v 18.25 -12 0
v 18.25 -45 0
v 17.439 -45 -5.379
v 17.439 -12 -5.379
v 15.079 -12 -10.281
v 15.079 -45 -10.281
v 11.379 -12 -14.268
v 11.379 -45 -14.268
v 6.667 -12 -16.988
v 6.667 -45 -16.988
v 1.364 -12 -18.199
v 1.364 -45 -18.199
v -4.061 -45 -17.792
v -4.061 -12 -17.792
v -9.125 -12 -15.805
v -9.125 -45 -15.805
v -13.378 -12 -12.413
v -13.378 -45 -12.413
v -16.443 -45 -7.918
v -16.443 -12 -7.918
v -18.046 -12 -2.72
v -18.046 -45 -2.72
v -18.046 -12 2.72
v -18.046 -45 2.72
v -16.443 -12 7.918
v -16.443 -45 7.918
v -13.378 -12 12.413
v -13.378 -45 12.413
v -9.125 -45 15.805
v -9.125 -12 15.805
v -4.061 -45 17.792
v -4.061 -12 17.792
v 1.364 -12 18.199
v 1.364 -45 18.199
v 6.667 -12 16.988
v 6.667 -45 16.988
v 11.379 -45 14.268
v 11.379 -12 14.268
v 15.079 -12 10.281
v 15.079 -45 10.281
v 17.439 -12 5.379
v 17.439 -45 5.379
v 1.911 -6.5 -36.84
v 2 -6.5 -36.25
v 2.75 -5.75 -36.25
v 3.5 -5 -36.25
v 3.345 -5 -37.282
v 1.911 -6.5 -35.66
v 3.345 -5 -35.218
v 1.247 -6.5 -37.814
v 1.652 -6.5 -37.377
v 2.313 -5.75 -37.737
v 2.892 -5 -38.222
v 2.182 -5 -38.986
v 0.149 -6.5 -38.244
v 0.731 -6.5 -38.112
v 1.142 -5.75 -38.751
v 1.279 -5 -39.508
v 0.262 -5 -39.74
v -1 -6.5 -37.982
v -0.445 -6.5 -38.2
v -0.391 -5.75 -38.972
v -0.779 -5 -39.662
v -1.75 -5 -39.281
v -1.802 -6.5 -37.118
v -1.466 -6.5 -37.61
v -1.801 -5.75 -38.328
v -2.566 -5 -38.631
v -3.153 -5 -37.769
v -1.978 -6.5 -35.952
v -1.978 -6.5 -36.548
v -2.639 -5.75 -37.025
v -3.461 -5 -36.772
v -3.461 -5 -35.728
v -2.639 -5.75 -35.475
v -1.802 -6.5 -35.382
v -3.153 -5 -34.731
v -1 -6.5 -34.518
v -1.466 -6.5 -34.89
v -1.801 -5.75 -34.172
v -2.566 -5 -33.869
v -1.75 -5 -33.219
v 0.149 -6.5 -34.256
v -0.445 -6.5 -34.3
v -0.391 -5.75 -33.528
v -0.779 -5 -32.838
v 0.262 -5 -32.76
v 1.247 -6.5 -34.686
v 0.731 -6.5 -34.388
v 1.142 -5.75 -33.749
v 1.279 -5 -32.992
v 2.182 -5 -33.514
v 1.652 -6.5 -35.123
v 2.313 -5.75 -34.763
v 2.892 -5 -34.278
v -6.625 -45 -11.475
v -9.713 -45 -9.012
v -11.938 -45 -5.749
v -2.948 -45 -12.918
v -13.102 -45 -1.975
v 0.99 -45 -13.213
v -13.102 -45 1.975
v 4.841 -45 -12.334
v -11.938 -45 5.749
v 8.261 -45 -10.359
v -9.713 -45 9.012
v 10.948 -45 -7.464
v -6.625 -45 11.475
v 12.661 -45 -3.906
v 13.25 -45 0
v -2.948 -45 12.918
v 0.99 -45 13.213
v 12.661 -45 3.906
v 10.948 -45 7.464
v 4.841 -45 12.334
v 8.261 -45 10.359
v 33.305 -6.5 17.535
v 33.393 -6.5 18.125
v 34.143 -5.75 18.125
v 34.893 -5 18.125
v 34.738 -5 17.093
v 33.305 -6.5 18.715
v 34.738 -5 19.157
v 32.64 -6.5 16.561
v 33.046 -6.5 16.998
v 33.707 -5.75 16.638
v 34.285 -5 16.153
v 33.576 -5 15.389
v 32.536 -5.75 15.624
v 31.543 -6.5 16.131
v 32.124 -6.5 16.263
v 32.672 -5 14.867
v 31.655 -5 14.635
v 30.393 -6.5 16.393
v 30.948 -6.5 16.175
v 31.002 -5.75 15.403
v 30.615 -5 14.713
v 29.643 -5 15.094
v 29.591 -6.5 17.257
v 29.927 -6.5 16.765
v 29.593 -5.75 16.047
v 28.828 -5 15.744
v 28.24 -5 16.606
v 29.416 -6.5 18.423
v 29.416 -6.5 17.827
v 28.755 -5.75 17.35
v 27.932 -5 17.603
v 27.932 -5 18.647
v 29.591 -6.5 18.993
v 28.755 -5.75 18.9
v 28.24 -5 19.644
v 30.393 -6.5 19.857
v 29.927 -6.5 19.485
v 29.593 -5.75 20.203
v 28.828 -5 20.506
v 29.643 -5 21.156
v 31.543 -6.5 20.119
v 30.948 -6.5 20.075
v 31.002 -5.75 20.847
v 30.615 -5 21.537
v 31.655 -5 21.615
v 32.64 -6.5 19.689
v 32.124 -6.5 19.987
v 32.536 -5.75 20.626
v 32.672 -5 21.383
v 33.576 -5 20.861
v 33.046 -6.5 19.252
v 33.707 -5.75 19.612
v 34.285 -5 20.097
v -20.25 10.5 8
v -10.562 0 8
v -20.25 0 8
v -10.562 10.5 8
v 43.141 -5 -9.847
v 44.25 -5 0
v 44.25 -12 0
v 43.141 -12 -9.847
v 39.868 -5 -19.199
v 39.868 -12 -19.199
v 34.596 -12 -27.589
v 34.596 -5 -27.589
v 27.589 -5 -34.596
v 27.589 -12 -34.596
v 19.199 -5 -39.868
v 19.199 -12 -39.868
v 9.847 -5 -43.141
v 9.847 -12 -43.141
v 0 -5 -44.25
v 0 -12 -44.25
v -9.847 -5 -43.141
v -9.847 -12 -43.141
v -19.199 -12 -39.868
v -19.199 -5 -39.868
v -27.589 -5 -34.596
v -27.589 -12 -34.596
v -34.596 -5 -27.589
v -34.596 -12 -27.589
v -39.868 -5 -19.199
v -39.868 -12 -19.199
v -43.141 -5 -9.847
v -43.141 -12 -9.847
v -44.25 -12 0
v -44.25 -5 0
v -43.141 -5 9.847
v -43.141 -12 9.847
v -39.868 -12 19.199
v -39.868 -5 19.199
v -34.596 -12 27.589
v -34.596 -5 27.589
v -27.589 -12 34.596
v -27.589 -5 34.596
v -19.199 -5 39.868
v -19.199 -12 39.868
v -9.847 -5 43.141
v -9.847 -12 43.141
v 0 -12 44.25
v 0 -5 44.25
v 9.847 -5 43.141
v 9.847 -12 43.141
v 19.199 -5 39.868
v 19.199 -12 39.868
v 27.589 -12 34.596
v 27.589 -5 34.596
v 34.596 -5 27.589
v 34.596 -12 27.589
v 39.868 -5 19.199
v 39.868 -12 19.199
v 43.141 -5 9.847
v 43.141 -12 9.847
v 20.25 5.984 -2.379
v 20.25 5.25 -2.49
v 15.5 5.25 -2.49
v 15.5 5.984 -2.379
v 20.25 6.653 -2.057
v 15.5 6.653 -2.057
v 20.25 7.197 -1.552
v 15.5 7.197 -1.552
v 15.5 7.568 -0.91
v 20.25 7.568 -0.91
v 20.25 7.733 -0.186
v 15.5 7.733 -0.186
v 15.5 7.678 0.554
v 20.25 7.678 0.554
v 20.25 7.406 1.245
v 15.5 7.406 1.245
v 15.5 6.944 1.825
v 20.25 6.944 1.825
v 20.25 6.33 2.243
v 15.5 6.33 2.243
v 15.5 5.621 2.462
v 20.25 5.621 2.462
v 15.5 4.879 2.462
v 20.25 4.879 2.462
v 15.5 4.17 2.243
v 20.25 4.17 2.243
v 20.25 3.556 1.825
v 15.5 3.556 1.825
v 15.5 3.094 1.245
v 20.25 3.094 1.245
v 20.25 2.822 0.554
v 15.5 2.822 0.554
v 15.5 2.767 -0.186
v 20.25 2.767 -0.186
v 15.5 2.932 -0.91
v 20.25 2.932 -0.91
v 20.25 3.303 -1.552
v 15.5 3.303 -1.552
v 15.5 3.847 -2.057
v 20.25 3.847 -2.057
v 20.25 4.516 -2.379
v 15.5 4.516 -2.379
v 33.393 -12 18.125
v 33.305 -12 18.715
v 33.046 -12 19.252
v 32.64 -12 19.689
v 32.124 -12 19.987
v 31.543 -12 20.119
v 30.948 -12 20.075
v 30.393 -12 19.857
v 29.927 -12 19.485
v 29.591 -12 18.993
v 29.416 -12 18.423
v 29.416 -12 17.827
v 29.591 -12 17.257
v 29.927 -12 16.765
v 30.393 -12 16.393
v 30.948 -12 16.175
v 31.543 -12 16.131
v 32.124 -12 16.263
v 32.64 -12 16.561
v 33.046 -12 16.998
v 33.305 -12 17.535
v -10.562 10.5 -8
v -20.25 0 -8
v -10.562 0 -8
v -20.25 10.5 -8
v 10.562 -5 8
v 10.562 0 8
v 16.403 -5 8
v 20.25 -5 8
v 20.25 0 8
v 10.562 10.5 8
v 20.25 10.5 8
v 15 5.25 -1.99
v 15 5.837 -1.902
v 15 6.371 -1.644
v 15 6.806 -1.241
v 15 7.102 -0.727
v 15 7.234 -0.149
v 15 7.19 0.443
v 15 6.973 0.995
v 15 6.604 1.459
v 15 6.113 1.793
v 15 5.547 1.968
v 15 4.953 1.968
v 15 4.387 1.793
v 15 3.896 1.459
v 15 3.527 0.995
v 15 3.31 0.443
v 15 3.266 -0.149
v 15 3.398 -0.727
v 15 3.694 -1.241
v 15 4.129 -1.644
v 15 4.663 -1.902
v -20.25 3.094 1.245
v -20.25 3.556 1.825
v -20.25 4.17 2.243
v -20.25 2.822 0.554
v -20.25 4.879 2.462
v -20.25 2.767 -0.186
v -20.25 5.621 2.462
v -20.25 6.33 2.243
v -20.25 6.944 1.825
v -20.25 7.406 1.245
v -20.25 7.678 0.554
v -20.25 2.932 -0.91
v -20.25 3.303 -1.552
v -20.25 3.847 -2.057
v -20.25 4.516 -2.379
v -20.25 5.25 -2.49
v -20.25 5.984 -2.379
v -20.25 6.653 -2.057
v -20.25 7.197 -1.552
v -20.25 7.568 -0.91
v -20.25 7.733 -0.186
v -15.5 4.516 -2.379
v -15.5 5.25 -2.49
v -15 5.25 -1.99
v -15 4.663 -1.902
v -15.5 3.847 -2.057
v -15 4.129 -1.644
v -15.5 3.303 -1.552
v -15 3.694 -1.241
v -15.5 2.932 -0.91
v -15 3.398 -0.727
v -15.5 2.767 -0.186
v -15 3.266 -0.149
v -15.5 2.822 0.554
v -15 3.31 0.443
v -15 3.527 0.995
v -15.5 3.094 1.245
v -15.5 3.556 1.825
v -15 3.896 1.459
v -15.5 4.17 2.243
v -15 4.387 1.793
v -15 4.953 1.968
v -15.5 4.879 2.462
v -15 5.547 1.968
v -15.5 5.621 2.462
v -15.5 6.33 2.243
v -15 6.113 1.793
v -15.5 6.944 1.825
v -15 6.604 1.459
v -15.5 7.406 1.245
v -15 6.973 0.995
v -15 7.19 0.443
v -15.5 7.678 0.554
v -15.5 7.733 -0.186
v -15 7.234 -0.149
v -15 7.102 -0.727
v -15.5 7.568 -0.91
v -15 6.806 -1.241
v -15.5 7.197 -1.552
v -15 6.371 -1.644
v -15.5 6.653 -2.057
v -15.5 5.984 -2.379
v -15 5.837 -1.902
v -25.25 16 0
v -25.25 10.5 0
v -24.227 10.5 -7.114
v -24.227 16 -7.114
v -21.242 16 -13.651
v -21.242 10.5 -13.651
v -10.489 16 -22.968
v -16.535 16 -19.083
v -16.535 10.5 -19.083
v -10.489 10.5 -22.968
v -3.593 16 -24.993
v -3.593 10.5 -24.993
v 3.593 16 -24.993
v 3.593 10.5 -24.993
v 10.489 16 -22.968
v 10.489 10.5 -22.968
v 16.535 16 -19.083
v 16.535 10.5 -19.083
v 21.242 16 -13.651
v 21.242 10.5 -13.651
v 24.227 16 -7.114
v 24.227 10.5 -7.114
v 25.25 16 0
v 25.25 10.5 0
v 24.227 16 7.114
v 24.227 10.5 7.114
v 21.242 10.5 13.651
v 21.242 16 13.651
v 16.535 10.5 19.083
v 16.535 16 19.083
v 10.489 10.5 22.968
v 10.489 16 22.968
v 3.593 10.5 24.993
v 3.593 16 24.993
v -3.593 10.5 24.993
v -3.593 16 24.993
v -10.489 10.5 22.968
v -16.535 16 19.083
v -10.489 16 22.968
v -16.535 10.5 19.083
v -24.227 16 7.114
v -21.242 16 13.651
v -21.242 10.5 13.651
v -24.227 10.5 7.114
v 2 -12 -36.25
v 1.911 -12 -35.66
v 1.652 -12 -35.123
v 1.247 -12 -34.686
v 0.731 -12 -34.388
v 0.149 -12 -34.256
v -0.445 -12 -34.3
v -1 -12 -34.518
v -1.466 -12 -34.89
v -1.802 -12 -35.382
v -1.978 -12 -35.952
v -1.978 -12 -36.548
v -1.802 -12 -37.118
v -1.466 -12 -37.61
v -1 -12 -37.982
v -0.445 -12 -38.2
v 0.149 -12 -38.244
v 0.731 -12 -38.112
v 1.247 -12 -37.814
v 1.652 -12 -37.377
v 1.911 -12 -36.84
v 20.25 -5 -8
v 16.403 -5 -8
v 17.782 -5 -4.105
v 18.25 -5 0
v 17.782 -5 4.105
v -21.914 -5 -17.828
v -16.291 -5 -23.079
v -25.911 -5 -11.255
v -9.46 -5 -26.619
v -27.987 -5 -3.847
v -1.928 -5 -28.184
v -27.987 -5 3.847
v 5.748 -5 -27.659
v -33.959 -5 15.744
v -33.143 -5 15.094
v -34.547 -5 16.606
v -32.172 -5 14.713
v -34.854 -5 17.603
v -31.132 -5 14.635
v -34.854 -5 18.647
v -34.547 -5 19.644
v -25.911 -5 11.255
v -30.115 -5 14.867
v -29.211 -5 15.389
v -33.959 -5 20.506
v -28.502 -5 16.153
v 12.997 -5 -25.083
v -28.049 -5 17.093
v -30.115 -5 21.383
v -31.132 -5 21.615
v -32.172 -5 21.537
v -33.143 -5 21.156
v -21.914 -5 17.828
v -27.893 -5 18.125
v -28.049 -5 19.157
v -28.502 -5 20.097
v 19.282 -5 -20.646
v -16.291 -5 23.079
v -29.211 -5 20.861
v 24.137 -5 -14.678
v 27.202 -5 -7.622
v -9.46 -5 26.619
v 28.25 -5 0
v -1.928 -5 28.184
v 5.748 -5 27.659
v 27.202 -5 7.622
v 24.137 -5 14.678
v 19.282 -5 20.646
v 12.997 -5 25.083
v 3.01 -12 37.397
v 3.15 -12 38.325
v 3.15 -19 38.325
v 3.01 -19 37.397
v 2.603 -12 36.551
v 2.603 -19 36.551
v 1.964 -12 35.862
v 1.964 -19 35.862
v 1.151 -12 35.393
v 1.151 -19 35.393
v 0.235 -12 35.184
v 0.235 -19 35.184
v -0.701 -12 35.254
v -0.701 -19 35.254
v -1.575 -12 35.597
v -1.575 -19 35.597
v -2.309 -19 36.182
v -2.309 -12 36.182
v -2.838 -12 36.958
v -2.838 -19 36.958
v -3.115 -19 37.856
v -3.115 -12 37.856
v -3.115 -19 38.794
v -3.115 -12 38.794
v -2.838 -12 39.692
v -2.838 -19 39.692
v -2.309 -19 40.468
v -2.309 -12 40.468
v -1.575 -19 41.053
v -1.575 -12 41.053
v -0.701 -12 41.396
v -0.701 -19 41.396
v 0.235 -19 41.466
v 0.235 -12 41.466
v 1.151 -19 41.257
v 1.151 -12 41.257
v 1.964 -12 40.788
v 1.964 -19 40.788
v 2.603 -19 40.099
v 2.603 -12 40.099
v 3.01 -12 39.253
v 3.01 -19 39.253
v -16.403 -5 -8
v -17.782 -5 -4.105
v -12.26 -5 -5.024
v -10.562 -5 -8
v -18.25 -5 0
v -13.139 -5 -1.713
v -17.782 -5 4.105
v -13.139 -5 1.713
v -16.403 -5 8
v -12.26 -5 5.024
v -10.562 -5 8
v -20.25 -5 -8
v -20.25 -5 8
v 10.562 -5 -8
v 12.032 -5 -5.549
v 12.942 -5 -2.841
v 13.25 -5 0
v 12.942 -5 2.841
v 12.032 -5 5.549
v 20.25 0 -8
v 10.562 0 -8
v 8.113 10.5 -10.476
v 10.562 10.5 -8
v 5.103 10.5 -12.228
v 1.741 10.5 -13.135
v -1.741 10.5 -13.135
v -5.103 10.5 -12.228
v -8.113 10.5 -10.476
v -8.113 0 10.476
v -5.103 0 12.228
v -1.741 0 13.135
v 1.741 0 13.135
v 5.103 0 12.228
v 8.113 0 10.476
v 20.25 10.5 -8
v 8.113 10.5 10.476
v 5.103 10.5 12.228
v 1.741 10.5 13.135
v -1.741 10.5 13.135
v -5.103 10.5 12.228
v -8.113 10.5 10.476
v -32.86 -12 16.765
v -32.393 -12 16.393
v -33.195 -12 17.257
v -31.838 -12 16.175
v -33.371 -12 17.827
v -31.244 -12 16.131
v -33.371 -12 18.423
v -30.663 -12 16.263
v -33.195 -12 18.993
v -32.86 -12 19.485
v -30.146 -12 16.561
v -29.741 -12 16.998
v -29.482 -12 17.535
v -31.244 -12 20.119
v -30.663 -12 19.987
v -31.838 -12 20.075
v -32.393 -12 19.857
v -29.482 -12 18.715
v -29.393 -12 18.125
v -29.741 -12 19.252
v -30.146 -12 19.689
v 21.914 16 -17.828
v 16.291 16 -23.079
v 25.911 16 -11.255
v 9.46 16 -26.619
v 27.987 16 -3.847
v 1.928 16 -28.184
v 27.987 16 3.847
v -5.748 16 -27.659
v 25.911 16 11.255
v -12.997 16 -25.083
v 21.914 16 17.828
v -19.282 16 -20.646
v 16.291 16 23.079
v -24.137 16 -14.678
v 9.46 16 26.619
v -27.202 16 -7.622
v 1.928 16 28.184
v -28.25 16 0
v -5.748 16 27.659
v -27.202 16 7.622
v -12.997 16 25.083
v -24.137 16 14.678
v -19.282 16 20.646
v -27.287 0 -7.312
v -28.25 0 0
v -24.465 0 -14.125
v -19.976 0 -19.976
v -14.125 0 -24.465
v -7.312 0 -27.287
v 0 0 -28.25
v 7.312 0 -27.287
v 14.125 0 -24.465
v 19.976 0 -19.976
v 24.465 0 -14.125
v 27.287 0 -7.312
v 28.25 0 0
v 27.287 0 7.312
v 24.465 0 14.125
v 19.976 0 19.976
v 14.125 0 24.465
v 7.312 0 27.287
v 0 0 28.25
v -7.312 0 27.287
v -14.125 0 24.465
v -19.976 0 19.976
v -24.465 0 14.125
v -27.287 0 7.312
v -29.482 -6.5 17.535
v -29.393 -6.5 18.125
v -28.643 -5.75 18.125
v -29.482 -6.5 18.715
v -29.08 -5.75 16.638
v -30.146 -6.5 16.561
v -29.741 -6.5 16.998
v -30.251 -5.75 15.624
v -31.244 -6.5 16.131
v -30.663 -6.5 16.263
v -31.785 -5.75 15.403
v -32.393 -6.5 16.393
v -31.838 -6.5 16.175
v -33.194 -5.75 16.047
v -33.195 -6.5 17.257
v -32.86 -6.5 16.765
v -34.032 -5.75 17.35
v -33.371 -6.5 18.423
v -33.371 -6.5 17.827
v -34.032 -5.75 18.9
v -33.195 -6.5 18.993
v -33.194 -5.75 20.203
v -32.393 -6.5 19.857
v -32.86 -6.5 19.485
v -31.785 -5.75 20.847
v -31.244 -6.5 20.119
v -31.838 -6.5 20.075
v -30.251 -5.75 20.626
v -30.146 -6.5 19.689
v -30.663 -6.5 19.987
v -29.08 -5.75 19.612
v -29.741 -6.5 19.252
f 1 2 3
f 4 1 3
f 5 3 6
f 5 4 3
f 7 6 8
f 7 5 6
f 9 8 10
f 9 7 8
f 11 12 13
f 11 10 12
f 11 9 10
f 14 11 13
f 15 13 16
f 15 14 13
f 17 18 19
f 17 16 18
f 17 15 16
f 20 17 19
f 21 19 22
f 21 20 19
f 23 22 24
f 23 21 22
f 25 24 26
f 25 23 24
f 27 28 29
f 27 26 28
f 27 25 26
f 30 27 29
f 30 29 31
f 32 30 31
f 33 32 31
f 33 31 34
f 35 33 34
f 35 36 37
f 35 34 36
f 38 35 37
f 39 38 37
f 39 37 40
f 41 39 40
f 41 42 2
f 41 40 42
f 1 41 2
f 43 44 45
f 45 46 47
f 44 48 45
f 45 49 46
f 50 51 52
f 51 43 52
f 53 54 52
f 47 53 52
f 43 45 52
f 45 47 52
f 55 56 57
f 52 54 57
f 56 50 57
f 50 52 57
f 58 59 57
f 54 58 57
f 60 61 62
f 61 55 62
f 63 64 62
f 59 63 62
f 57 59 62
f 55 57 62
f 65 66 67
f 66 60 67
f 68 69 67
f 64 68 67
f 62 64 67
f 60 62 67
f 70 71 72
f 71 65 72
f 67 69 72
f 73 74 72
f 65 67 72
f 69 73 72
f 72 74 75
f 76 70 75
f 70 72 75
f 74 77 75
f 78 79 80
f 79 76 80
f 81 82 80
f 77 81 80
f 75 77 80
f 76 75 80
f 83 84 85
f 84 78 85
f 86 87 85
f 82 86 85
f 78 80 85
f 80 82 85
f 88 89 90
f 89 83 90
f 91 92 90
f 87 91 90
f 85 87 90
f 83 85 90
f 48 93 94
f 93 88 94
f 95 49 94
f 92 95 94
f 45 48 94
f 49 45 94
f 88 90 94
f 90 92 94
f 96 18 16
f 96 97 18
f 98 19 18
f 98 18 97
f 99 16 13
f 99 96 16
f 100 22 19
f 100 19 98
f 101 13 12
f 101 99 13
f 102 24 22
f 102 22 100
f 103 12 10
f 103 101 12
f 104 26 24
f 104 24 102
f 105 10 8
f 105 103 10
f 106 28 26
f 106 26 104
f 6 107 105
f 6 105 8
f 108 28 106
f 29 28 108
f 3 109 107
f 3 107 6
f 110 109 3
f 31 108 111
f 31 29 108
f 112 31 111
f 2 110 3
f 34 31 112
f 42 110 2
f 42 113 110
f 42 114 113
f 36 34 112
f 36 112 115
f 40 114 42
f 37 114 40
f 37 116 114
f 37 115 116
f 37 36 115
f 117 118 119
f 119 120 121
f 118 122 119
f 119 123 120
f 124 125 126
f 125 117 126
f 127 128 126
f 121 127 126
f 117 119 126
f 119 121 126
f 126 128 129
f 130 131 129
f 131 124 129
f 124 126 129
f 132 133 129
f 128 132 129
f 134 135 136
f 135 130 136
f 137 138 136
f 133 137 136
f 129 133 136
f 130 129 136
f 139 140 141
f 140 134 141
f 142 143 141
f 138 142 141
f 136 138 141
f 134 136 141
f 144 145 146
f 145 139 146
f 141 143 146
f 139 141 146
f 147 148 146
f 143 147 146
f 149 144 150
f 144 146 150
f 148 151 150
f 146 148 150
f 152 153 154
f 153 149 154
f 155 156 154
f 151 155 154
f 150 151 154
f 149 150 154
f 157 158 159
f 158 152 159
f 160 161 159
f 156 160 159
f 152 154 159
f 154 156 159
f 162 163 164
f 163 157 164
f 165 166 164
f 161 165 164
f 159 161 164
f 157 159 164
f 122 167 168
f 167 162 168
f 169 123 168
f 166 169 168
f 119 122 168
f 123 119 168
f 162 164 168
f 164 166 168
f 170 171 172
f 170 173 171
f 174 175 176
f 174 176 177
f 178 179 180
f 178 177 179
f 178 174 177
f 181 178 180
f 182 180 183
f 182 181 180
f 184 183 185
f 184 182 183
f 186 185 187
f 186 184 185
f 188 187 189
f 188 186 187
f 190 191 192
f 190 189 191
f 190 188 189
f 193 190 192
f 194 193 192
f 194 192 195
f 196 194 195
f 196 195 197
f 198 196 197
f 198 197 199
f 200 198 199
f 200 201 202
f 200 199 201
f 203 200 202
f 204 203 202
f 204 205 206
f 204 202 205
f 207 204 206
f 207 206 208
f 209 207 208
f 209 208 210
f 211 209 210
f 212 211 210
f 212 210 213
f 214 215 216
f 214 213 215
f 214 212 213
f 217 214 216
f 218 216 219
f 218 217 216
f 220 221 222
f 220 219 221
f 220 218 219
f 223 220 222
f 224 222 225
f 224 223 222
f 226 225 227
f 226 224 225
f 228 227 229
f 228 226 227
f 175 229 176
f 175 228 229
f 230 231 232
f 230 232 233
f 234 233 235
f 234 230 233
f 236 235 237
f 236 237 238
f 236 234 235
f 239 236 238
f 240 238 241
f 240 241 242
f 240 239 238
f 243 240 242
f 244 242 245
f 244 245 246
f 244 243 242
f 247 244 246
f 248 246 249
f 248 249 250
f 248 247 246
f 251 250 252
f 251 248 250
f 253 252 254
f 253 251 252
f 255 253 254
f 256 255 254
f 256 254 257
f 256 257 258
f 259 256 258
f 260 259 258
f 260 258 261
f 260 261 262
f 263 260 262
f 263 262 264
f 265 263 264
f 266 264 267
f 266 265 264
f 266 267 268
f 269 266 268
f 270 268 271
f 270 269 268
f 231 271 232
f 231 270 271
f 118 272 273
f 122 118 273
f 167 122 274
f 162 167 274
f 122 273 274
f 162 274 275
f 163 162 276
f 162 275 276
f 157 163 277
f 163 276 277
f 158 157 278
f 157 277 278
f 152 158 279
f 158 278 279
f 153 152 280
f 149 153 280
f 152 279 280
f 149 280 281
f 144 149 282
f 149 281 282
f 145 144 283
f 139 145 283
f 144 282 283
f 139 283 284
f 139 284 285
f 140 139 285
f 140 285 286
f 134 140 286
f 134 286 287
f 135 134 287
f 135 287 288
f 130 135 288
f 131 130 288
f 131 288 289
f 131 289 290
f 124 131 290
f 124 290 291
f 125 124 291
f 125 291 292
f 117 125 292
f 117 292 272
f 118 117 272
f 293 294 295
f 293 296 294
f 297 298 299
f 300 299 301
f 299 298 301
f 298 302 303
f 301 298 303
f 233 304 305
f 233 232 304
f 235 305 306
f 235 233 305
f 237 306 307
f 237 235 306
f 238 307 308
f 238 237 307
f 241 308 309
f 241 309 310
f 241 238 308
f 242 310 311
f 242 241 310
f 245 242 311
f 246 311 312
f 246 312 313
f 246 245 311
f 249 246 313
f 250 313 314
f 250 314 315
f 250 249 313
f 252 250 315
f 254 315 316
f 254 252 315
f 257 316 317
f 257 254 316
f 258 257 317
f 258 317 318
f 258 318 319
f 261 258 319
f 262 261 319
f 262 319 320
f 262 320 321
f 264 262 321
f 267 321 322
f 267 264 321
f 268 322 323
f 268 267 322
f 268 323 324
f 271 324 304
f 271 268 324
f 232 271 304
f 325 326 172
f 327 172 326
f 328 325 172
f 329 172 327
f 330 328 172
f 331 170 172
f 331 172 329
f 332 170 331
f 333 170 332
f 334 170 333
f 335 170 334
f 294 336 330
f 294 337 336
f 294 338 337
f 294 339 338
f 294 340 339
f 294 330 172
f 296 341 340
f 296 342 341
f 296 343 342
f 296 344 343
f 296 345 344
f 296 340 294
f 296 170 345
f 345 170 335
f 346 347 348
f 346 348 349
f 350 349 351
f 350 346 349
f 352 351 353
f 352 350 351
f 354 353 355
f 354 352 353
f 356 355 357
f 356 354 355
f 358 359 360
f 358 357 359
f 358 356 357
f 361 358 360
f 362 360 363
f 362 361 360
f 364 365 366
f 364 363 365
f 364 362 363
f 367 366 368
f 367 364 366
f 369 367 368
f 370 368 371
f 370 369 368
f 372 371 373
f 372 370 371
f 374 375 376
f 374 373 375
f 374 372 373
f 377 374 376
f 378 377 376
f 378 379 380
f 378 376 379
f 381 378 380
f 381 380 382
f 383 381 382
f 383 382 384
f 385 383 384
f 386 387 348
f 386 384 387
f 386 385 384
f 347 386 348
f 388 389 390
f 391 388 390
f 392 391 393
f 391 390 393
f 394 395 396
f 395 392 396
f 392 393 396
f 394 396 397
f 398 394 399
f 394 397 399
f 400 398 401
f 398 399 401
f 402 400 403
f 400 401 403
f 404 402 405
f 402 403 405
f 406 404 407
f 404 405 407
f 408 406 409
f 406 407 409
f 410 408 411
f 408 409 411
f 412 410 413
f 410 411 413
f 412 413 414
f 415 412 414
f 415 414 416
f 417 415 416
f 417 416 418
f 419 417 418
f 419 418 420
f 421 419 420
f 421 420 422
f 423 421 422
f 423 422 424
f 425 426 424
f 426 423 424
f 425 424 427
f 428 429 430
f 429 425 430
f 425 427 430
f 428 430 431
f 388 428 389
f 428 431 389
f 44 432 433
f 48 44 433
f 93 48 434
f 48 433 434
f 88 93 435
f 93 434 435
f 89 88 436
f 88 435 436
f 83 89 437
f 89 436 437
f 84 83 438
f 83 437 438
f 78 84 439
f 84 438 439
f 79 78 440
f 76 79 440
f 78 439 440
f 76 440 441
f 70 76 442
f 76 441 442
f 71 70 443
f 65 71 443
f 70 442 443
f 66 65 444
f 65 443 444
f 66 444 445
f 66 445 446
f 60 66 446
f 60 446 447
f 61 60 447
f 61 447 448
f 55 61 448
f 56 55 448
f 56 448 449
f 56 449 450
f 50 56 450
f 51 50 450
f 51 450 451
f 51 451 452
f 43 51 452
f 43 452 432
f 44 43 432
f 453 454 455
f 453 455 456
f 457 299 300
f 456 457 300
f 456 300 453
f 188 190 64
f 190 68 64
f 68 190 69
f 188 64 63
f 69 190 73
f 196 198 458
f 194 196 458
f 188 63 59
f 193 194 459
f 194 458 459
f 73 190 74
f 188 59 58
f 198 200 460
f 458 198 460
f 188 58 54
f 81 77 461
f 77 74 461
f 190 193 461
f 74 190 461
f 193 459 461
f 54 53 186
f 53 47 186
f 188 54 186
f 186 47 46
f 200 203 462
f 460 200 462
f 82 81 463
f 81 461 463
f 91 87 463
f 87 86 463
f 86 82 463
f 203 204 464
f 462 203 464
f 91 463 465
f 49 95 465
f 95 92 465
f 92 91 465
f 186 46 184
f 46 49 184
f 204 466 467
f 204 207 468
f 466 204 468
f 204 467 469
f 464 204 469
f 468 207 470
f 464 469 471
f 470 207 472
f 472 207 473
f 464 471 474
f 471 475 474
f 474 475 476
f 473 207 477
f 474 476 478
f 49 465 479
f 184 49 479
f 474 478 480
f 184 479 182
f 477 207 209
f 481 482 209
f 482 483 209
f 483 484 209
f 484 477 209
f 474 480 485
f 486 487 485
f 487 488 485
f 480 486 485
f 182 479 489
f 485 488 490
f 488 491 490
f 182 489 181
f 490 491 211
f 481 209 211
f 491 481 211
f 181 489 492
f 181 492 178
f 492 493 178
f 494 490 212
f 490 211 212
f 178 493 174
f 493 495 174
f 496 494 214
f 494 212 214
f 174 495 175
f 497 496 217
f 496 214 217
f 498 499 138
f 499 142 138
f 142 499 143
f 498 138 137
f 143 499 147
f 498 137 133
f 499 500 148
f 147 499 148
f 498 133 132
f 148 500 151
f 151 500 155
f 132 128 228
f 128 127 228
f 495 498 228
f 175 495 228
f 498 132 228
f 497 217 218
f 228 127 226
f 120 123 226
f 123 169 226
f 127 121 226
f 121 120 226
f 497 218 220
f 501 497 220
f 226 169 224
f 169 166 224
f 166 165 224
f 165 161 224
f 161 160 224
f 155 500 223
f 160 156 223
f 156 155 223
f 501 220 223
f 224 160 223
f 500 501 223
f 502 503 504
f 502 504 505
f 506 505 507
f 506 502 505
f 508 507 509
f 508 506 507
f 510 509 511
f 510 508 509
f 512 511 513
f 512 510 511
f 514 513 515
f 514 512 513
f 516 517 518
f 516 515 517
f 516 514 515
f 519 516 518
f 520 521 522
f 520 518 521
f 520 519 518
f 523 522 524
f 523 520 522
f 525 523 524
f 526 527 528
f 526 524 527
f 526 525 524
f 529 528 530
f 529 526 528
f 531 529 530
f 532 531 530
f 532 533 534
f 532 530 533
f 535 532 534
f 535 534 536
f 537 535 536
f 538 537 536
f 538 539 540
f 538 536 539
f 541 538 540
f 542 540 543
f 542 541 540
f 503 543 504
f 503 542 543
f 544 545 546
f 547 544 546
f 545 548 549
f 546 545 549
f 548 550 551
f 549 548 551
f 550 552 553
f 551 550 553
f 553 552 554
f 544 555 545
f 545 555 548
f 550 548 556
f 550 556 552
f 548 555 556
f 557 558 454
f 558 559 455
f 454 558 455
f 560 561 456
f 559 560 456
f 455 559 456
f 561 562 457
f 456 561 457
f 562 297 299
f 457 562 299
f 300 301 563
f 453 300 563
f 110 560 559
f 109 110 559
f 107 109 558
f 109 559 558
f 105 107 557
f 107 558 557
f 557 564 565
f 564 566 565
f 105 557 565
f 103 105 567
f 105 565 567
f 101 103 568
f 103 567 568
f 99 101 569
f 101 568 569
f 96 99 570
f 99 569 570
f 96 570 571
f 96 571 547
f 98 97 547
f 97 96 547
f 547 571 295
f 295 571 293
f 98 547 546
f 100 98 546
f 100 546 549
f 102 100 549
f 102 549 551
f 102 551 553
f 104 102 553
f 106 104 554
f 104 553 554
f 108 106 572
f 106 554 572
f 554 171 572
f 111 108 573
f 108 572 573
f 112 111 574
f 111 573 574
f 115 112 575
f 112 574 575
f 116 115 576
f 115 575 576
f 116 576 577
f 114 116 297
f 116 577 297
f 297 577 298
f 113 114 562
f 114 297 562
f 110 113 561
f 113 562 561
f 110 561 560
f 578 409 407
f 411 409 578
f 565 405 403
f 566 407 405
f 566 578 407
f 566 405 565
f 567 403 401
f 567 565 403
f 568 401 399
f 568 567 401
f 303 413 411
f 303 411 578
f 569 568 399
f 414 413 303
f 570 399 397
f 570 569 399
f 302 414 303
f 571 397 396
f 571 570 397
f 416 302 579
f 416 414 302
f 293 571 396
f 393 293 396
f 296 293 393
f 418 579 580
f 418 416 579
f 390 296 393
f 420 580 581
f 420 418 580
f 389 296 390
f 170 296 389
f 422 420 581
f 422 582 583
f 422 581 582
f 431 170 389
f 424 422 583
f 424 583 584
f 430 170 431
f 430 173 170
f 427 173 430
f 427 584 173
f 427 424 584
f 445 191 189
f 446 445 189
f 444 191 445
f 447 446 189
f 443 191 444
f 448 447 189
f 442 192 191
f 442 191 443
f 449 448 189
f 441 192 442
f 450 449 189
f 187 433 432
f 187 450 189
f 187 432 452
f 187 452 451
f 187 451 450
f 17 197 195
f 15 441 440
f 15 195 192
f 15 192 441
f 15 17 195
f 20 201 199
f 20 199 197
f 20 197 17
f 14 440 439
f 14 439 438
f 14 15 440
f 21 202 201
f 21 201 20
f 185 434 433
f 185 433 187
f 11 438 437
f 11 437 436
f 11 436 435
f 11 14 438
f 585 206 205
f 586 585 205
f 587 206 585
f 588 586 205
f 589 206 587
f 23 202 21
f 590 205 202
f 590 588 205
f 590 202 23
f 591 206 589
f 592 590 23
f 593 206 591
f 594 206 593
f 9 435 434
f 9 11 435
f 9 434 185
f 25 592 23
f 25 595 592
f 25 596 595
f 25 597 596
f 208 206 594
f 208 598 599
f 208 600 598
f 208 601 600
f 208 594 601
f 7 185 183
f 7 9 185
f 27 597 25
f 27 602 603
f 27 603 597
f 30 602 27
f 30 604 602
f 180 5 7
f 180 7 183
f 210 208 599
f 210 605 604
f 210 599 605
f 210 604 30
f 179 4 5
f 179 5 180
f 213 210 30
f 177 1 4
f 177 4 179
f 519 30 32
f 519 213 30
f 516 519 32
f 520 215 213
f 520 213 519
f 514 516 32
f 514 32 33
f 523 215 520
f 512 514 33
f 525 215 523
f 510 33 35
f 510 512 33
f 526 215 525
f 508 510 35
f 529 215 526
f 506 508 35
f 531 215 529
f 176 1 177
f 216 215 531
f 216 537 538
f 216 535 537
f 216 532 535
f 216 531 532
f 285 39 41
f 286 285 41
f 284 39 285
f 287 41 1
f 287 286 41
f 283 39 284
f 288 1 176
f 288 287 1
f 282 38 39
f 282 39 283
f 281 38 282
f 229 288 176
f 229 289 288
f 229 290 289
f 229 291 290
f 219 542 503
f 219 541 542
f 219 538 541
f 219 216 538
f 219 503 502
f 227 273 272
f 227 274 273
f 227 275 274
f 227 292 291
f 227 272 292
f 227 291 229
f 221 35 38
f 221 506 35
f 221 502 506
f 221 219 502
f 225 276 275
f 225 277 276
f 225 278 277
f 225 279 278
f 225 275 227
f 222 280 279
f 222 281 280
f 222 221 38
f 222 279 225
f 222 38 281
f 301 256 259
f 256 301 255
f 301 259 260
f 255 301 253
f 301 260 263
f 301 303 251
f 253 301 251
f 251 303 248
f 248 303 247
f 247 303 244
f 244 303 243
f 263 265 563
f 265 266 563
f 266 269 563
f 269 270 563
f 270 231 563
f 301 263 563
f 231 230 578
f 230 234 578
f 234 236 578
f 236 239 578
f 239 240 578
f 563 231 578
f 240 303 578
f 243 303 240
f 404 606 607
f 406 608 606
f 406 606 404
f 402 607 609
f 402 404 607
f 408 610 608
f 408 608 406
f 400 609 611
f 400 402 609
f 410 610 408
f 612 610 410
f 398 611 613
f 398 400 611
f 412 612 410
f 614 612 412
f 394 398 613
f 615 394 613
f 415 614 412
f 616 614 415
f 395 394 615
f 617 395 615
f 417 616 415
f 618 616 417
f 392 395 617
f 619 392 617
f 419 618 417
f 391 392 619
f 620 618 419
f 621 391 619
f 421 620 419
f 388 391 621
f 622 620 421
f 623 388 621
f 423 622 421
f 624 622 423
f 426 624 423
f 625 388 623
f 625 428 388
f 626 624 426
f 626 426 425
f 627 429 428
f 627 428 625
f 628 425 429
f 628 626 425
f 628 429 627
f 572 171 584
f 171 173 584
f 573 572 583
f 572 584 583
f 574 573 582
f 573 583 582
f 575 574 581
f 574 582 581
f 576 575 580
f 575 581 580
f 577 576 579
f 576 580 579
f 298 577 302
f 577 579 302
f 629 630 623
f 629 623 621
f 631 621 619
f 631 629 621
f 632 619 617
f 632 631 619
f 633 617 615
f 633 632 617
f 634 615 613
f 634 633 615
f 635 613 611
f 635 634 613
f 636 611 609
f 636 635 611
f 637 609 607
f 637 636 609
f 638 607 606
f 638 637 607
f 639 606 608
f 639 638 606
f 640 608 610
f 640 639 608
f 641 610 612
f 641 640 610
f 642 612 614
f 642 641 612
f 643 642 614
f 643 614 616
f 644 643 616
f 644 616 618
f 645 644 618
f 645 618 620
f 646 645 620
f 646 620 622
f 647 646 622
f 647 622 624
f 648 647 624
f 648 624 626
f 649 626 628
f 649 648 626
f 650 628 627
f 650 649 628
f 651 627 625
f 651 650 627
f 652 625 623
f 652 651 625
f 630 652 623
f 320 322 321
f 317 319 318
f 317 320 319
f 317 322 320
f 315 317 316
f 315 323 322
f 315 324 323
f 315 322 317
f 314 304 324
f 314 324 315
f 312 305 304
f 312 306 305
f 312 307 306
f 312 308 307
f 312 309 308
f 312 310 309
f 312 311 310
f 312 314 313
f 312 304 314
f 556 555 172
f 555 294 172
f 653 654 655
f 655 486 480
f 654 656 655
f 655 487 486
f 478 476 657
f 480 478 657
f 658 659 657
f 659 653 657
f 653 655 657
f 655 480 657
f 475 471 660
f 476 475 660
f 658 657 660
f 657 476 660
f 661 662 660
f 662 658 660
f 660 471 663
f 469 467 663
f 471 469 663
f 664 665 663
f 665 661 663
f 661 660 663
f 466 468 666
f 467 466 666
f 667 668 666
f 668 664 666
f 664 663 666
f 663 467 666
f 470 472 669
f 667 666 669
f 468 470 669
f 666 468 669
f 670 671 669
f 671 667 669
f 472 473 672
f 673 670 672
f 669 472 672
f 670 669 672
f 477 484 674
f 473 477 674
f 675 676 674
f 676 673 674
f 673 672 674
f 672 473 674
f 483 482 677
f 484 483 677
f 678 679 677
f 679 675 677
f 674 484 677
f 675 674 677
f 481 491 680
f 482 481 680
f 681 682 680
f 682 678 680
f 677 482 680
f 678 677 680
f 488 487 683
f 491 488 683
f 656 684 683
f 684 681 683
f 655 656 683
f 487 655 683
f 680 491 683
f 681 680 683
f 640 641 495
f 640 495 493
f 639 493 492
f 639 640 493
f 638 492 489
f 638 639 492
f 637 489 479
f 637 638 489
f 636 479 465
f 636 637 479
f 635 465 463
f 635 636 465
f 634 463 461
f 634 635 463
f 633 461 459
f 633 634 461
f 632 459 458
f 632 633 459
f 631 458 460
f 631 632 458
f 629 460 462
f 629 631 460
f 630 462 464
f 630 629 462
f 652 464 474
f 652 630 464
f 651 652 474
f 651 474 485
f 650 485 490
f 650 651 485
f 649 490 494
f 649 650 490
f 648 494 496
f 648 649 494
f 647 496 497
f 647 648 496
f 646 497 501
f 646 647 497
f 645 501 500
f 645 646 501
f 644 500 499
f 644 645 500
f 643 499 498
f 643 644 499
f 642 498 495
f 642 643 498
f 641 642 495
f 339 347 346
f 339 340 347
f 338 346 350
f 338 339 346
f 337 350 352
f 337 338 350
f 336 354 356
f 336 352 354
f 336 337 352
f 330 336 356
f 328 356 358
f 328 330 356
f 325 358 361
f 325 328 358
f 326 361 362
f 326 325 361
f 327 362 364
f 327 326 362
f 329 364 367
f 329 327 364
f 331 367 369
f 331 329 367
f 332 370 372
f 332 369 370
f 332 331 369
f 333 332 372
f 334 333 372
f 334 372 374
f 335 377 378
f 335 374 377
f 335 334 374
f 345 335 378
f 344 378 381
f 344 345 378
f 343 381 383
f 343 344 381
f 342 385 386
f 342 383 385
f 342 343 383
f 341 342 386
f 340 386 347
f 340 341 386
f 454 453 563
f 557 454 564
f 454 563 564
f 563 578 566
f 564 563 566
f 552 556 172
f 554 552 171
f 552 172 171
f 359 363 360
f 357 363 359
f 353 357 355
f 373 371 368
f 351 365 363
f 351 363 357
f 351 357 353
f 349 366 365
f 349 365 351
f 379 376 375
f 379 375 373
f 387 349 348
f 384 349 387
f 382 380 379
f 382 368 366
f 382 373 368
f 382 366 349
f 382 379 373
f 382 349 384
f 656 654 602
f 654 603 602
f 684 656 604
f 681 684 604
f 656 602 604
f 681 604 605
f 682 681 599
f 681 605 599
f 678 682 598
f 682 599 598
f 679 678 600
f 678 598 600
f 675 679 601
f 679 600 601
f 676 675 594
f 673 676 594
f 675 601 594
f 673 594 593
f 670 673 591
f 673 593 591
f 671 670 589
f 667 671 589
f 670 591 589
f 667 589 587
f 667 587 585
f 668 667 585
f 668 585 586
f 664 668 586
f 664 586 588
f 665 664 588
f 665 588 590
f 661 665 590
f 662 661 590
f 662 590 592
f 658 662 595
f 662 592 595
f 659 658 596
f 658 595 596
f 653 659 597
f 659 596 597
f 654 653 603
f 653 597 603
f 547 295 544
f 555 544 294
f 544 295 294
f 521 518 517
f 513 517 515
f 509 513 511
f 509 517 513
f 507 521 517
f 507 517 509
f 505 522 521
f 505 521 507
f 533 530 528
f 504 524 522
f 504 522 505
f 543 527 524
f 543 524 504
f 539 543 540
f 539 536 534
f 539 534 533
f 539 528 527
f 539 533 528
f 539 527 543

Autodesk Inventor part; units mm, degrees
ref_plane "YZ Plane" through (0, 0, 0) normal (1, 0, 0) x (0, 1, 0)
ref_plane "XZ Plane" through (0, 0, 0) normal (0, 1, 0) x (-1, 0, 0)
sketch "Sketch1" plane through (0, 0, 0) normal (0, 1, 0) x (-1, 0, 0)
  circle A0 centre (0, 0) radius 13.25
  circle A1 centre (0, 0) radius 25.25
  circle A2 centre (0, 0) radius 28.25
  dimension "d0" = 26.5
  dimension "d1" = 12
  dimension "d2" = 3
extrude "Extrusion1" add sketch "Sketch1" along normal blind 16 contours A2
extrude "Extrusion2" add sketch "Sketch1" along normal blind 10.5 contours A1
sketch "Sketch2" plane through (0, 10.5, 0) normal (0, 1, 0) x (1, 0, 0)
  line L0 (0, -8) -> (20.25, -8)
  line L1 (20.25, -8) -> (20.25, 8)
  line L2 (20.25, 8) -> (0, 8)
  line L3 (0, 8) -> (0, -8)
  circle A0 centre (0, 0) radius 13.25 projected
  line L4 (0, -8) -> (-20.25, -8)
  line L5 (-20.25, -8) -> (-20.25, 8)
  line L6 (-20.25, 8) -> (0, 8)
  point P0 (10.5623, 8)
  point P1 (10.5623, -8)
  point P2 (-10.5623, -8)
  point P3 (-10.5623, 8)
  dimension "d7" = 20.25
  dimension "d8" = 0
  dimension "d9" = 16
extrude "Extrusion3" cut sketch "Sketch2" against normal blind 10.5 contours A0 L2 L1 L0 | L4 L5 L6 A0
sketch "Sketch3" plane through (-20.25, 10.5, 8) normal (1, 0, 0) x (0, 0, -1)
  circle A0 centre (8, -5.25) radius 2.49
  line L0 (0, 0) -> (16, 0) projected
  line L1 (0, 0) -> (0, -10.5) projected
  point P0 (8, -10.5)
  point P1 (8, 0)
  point P2 (0, -5.25)
  dimension "d12" = 4.98
  dimension "d13" = 0
  dimension "d14" = 0
extrude "Extrusion4" add sketch "Sketch3" along normal blind 5.25
chamfer "Chamfer1" distance 0.5 angle 45 1 edges at (-15, 5.25, 2.49)
ref_plane "Work Plane1" through (0, 0, 0) normal (1, 0, 0) x (0, 0, -1)
mirror "Mirror1" about plane through (0, 0, 0) normal (1, 0, 0) of "Extrusion4", "Chamfer1"
sketch "Sketch4" plane through (0, 0, 0) normal (0, -1, 0) x (1, 0, 0)
  circle A0 centre (0, 0) radius 28.25
  line L0 (20.25, -8) -> (10.5623, -8) projected
  line L1 (-20.25, 8) -> (-10.5623, 8) projected
  line L2 (20.25, -8) -> (-20.25, -8)
  line L3 (-20.25, -8) -> (-20.25, 8)
  line L4 (-20.25, 8) -> (20.25, 8)
  line L5 (20.25, 8) -> (20.25, -8)
  circle A1 centre (0, 0) radius 13.25
  point P0 (10.5623, 8)
  point P1 (-10.5623, -8)
extrude "Extrusion5" add sketch "Sketch4" along normal blind 5
sketch "Sketch5" plane through (0, -5, 0) normal (0, -1, 0) x (1, 0, 0)
  circle A0 centre (0, 0) radius 13.25
  circle A1 centre (0, 0) radius 18.25
  circle A2 centre (0, 0) radius 44.25
  dimension "d22" = 5
  dimension "d23" = 26
extrude "Extrusion6" add sketch "Sketch5" along normal blind 40 contours A1
extrude "Extrusion7" add sketch "Sketch5" along normal blind 7 contours A2
sketch "Sketch6" plane through (0, -12, 0) normal (0, -1, 0) x (1, 0, 0)
  circle A0 centre (0, 38.325) radius 3.15
  point P0 (0, 0)
  dimension "d28" = 6.3
  dimension "d29" = 38.325
extrude "Extrusion8" add sketch "Sketch6" along normal blind 7
sketch "Sketch7" plane through (0, -12, 0) normal (0, -1, 0) x (1, 0, 0)
  circle A0 centre (0, 0) radius 28.25 projected
  line L0 (0, -28.25) -> (0, -44.25)
  circle A1 centre (0, 0) radius 44.25 projected
  circle A2 centre (0, -36.25) radius 2
  circle A3 centre (31.3934, 18.125) radius 2
  circle A4 centre (-31.3934, 18.125) radius 2
  dimension "d32" = 4
  dimension "d35" = 360
extrude "Extrusion9" cut sketch "Sketch7" against normal blind 7 contours A2 L0 | L0 A2 | A3 | A4
chamfer "Chamfer2" distance 1.5 angle 45 3 edges at (29.3934, -5, 18.125) (-33.3934, -5, 18.125) (-2, -5, -36.25)
properties part number "birdhouse_holder_v1"
